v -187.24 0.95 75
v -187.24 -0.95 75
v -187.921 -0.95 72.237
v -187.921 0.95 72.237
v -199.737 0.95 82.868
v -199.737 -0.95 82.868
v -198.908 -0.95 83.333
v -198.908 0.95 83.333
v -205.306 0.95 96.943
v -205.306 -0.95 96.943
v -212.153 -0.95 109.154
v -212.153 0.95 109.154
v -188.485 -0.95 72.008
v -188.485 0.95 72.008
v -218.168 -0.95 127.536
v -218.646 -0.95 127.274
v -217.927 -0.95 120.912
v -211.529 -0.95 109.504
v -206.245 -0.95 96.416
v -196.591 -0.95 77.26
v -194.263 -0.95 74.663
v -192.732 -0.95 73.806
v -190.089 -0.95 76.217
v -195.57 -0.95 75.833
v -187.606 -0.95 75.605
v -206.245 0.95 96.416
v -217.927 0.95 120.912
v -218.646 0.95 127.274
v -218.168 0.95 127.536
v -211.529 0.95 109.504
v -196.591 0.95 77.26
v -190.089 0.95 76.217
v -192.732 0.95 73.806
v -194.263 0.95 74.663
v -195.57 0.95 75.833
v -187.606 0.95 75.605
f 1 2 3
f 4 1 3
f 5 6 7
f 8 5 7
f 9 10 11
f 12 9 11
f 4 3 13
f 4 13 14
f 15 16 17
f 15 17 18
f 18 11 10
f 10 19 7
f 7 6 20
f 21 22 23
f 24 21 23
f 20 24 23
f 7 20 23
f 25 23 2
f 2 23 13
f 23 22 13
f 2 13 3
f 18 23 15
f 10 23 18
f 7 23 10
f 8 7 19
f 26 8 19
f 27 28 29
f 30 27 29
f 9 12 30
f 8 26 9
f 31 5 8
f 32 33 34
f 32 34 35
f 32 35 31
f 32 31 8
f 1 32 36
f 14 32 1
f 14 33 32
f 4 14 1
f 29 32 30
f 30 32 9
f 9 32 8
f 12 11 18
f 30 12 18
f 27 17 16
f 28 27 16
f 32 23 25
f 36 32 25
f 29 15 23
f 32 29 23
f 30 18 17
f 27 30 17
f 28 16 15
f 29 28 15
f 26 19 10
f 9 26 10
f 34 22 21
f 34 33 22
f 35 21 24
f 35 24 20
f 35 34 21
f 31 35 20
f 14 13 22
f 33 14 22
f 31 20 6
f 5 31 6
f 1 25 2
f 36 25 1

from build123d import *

# Parameters (mm, degrees)
EXTRUDE_2_DEPTH      = 0.95
EXTRUDE_2_DEPTH_BACK = 0.95
FILLET_6_R           = 8
CHAMFER_1_SIZE       = 0.5
CHAMFER_2_SIZE       = 0.5
CHAMFER_2_SIZE2      = 0.436431784


with BuildPart() as part:
    # 草图3 → 凸台-拉伸2 (new, two sides: drawn at the far end of the back side and taken through both)
    with BuildSketch(Plane(origin=(0, 0, 0), x_dir=(1, 0, 0), z_dir=(0, 1, 0)).offset(-EXTRUDE_2_DEPTH_BACK)):
        Polygon((-187.120164296, -75.485656639), (-188.025009302, -71.812776929), (-195.252497915, -74.872539862), (-199.736508362, -82.868381819), (-198.907982221, -83.333013297), (-206.244927345, -96.416179437), (-205.305528647, -96.942987446), (-212.153344095, -109.15394251), (-211.528903604, -109.50412423), (-217.926627044, -120.91247979), (-218.646393726, -127.274440762), (-218.168094082, -127.536139913), (-190.089143959, -76.21708991), align=None)
    extrude(amount=EXTRUDE_2_DEPTH + EXTRUDE_2_DEPTH_BACK)

    # 圆角6
    fillet_6_edges = [part.edges().sort_by_distance(p)[0] for p in [
        (-195.252497915, 0, 74.872539862),
    ]]
    fillet(fillet_6_edges, radius=FILLET_6_R)

    # 倒角1
    chamfer_1_edges = [part.edges().sort_by_distance(p)[0] for p in [
        (-187.120164296, 0, 75.485656639),
    ]]
    chamfer(chamfer_1_edges, length=CHAMFER_1_SIZE)

    # 倒角2
    chamfer_2_edges = [part.edges().sort_by_distance(p)[0] for p in [
        (-188.025009302, 0, 71.812776929),
    ]]
    chamfer_2_side = [part.faces().sort_by_distance(p)[0] for p in [
        (-190.378641555, 0, 72.809188977),
    ]]
    chamfer(chamfer_2_edges, length=CHAMFER_2_SIZE, length2=CHAMFER_2_SIZE2, reference=chamfer_2_side[0])


solid = part.part
